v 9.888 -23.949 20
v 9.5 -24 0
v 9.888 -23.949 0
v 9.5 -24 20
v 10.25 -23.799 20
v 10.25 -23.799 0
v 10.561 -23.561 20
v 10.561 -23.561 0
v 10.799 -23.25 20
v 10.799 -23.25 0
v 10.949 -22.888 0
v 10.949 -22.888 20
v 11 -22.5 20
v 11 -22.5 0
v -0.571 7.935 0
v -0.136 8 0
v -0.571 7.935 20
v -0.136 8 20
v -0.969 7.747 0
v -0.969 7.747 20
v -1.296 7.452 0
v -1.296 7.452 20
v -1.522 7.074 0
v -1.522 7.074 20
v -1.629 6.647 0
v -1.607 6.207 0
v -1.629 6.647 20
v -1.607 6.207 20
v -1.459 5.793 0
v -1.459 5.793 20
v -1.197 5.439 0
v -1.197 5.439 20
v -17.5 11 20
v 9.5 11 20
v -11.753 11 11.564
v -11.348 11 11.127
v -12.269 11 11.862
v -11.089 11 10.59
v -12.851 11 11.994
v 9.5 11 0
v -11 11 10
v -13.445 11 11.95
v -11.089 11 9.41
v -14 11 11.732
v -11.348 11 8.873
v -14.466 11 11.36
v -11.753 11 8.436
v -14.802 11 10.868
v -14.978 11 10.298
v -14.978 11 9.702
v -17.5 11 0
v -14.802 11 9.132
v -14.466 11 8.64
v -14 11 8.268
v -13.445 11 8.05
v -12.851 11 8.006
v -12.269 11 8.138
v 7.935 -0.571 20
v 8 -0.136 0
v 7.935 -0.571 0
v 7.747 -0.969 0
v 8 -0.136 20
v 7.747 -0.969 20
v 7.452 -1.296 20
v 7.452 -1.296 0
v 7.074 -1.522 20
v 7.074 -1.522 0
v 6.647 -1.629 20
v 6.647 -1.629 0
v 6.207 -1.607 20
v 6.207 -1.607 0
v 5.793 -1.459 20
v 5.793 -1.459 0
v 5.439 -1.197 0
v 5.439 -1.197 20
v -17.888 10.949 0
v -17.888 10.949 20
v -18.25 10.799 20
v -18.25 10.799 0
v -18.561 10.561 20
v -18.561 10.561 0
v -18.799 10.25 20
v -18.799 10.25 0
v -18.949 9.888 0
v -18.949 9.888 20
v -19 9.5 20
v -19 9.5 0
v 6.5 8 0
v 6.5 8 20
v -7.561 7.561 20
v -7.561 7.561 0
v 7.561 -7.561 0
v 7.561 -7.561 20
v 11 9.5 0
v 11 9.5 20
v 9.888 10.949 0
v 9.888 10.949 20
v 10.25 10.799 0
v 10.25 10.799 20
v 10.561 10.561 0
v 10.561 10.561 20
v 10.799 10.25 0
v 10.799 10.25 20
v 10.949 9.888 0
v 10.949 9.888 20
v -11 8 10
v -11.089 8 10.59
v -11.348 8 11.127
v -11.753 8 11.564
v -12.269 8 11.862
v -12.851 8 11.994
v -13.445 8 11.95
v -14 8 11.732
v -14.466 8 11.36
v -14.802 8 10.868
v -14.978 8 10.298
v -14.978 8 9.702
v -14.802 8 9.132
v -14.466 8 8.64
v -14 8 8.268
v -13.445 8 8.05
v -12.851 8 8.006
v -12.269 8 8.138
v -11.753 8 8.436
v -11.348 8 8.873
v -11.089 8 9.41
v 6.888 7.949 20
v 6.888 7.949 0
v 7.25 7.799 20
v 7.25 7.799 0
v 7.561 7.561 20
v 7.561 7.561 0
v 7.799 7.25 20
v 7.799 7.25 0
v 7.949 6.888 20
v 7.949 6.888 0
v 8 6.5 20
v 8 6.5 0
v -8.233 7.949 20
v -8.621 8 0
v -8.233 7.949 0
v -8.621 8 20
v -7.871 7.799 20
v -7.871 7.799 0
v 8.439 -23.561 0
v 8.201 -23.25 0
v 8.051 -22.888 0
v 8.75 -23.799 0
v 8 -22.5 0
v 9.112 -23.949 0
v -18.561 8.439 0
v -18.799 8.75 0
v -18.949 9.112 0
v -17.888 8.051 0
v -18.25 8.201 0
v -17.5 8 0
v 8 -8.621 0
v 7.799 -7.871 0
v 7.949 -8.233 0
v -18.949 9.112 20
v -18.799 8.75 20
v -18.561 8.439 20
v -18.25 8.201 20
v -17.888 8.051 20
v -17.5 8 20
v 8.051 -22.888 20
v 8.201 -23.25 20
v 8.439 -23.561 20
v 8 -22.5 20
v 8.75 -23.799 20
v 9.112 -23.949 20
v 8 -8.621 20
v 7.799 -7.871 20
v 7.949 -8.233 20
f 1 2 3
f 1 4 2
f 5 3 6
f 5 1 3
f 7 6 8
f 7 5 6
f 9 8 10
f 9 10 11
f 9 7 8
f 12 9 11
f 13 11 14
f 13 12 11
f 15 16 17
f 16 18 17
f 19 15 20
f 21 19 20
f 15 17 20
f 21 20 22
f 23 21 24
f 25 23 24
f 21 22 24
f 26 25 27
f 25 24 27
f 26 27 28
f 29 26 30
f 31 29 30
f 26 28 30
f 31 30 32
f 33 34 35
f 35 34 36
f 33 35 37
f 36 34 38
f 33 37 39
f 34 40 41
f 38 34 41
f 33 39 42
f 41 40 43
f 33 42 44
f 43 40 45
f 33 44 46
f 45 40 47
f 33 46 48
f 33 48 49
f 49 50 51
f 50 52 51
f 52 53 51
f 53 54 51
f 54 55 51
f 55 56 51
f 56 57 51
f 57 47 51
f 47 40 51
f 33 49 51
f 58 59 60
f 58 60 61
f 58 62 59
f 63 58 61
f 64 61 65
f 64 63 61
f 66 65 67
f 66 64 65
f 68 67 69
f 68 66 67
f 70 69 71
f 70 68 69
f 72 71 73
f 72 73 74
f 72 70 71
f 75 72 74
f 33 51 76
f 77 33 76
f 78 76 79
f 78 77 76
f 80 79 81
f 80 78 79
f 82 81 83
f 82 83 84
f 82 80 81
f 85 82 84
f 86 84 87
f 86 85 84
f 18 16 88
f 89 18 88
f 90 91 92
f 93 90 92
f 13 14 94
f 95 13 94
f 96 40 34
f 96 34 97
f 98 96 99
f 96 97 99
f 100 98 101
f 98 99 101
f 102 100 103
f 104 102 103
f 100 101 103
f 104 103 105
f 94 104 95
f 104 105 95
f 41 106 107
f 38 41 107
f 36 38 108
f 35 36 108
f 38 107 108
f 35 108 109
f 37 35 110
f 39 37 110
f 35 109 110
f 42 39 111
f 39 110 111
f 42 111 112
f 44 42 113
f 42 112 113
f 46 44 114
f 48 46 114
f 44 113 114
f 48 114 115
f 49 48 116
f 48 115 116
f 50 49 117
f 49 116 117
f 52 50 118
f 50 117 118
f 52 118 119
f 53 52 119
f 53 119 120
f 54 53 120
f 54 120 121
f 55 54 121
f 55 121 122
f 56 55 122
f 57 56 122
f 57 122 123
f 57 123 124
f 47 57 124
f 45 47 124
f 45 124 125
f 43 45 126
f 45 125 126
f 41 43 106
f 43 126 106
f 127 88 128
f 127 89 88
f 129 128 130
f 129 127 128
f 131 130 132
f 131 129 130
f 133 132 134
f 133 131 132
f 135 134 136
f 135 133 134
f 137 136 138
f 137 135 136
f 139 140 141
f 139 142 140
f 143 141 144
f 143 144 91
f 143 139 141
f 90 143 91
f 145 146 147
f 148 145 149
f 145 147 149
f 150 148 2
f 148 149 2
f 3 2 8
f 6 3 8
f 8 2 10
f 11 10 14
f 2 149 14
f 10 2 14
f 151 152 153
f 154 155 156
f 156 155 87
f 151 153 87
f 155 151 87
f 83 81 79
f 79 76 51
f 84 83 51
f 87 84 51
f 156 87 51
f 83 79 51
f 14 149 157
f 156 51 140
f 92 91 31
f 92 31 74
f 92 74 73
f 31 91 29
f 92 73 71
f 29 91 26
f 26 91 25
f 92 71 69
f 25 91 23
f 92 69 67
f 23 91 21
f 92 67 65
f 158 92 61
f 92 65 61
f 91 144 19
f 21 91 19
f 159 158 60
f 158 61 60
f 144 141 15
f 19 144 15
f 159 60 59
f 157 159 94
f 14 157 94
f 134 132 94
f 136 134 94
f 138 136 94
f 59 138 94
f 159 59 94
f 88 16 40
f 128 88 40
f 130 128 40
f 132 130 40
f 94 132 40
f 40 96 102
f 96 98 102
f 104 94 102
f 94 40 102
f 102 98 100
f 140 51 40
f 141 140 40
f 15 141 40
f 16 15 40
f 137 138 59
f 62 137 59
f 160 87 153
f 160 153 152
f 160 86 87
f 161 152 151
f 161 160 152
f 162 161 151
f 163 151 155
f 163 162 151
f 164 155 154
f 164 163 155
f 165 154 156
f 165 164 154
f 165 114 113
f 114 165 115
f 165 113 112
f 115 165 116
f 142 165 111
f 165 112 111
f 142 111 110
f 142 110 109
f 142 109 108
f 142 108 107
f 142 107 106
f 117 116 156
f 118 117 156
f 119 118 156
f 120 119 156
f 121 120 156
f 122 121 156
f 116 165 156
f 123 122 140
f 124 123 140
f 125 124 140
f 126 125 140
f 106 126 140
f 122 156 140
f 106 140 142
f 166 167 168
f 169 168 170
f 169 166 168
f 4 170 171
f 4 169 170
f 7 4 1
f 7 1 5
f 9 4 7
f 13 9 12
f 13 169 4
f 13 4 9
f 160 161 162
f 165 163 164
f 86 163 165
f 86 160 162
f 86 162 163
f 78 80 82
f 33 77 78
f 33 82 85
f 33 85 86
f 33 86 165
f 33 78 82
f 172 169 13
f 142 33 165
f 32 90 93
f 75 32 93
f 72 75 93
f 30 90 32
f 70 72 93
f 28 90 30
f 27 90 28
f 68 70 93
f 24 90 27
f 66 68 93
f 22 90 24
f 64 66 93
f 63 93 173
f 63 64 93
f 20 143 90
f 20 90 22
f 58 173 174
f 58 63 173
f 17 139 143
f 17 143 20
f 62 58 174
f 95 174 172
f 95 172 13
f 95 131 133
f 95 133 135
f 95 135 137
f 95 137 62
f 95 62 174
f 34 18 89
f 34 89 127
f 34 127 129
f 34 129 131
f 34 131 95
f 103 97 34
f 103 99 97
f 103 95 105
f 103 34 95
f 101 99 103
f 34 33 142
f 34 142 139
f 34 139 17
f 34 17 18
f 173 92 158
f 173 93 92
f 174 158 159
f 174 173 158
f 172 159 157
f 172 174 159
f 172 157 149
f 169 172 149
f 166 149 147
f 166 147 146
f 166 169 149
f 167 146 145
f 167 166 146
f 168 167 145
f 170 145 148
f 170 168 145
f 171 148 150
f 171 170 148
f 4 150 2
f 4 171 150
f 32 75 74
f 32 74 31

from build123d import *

# Parameters (mm, degrees)
F1_DEPTH = 20
F3_R     = 1.49999
F2_R     = 2
F4_DEPTH = 3


# Not quite as in the source:
# - a fillet or chamfer is up to 0.001 mm smaller than in the source, because OpenCascade refuses the exact size


with BuildPart() as f1:
    # F0 (on Top) → F1 (new body)
    with BuildSketch(Plane.XY):
        Polygon((11, 11), (-19, 11), (-19, 8), (-8, 8), (-3.7573593129, 8), (8, 8), (8, -3.7573593129), (8, -8), (8, -24), (11, -24), align=None)
        Polygon((-3.7573593129, 8), (-8, 8), (8, -8), (8, -3.7573593129), align=None)
    extrude(amount=F1_DEPTH)

    # F3 (radius 1.5 in the source; OpenCascade refuses exactly that, so slightly less here)
    f3_edges = [f1.edges().sort_by_distance(p)[0] for p in [
        (-19, 8, 10),
        (-19, 11, 10),
        (-8, 8, 10),
        (8, -24, 10),
        (11, -24, 10),
        (8, -8, 10),
        (8, 8, 10),
        (11, 11, 10),
        (-3.757359, 8, 10),
        (8, -3.757359, 10),
    ]]
    fillet(f3_edges, radius=F3_R)

    # F2 (on face) → F4 (cut, through all)
    with BuildSketch(Plane.XZ.offset(-8)):
        with Locations((-13, 10)):
            Circle(F2_R)
    extrude(amount=-F4_DEPTH, mode=Mode.SUBTRACT)


solid = f1.part
